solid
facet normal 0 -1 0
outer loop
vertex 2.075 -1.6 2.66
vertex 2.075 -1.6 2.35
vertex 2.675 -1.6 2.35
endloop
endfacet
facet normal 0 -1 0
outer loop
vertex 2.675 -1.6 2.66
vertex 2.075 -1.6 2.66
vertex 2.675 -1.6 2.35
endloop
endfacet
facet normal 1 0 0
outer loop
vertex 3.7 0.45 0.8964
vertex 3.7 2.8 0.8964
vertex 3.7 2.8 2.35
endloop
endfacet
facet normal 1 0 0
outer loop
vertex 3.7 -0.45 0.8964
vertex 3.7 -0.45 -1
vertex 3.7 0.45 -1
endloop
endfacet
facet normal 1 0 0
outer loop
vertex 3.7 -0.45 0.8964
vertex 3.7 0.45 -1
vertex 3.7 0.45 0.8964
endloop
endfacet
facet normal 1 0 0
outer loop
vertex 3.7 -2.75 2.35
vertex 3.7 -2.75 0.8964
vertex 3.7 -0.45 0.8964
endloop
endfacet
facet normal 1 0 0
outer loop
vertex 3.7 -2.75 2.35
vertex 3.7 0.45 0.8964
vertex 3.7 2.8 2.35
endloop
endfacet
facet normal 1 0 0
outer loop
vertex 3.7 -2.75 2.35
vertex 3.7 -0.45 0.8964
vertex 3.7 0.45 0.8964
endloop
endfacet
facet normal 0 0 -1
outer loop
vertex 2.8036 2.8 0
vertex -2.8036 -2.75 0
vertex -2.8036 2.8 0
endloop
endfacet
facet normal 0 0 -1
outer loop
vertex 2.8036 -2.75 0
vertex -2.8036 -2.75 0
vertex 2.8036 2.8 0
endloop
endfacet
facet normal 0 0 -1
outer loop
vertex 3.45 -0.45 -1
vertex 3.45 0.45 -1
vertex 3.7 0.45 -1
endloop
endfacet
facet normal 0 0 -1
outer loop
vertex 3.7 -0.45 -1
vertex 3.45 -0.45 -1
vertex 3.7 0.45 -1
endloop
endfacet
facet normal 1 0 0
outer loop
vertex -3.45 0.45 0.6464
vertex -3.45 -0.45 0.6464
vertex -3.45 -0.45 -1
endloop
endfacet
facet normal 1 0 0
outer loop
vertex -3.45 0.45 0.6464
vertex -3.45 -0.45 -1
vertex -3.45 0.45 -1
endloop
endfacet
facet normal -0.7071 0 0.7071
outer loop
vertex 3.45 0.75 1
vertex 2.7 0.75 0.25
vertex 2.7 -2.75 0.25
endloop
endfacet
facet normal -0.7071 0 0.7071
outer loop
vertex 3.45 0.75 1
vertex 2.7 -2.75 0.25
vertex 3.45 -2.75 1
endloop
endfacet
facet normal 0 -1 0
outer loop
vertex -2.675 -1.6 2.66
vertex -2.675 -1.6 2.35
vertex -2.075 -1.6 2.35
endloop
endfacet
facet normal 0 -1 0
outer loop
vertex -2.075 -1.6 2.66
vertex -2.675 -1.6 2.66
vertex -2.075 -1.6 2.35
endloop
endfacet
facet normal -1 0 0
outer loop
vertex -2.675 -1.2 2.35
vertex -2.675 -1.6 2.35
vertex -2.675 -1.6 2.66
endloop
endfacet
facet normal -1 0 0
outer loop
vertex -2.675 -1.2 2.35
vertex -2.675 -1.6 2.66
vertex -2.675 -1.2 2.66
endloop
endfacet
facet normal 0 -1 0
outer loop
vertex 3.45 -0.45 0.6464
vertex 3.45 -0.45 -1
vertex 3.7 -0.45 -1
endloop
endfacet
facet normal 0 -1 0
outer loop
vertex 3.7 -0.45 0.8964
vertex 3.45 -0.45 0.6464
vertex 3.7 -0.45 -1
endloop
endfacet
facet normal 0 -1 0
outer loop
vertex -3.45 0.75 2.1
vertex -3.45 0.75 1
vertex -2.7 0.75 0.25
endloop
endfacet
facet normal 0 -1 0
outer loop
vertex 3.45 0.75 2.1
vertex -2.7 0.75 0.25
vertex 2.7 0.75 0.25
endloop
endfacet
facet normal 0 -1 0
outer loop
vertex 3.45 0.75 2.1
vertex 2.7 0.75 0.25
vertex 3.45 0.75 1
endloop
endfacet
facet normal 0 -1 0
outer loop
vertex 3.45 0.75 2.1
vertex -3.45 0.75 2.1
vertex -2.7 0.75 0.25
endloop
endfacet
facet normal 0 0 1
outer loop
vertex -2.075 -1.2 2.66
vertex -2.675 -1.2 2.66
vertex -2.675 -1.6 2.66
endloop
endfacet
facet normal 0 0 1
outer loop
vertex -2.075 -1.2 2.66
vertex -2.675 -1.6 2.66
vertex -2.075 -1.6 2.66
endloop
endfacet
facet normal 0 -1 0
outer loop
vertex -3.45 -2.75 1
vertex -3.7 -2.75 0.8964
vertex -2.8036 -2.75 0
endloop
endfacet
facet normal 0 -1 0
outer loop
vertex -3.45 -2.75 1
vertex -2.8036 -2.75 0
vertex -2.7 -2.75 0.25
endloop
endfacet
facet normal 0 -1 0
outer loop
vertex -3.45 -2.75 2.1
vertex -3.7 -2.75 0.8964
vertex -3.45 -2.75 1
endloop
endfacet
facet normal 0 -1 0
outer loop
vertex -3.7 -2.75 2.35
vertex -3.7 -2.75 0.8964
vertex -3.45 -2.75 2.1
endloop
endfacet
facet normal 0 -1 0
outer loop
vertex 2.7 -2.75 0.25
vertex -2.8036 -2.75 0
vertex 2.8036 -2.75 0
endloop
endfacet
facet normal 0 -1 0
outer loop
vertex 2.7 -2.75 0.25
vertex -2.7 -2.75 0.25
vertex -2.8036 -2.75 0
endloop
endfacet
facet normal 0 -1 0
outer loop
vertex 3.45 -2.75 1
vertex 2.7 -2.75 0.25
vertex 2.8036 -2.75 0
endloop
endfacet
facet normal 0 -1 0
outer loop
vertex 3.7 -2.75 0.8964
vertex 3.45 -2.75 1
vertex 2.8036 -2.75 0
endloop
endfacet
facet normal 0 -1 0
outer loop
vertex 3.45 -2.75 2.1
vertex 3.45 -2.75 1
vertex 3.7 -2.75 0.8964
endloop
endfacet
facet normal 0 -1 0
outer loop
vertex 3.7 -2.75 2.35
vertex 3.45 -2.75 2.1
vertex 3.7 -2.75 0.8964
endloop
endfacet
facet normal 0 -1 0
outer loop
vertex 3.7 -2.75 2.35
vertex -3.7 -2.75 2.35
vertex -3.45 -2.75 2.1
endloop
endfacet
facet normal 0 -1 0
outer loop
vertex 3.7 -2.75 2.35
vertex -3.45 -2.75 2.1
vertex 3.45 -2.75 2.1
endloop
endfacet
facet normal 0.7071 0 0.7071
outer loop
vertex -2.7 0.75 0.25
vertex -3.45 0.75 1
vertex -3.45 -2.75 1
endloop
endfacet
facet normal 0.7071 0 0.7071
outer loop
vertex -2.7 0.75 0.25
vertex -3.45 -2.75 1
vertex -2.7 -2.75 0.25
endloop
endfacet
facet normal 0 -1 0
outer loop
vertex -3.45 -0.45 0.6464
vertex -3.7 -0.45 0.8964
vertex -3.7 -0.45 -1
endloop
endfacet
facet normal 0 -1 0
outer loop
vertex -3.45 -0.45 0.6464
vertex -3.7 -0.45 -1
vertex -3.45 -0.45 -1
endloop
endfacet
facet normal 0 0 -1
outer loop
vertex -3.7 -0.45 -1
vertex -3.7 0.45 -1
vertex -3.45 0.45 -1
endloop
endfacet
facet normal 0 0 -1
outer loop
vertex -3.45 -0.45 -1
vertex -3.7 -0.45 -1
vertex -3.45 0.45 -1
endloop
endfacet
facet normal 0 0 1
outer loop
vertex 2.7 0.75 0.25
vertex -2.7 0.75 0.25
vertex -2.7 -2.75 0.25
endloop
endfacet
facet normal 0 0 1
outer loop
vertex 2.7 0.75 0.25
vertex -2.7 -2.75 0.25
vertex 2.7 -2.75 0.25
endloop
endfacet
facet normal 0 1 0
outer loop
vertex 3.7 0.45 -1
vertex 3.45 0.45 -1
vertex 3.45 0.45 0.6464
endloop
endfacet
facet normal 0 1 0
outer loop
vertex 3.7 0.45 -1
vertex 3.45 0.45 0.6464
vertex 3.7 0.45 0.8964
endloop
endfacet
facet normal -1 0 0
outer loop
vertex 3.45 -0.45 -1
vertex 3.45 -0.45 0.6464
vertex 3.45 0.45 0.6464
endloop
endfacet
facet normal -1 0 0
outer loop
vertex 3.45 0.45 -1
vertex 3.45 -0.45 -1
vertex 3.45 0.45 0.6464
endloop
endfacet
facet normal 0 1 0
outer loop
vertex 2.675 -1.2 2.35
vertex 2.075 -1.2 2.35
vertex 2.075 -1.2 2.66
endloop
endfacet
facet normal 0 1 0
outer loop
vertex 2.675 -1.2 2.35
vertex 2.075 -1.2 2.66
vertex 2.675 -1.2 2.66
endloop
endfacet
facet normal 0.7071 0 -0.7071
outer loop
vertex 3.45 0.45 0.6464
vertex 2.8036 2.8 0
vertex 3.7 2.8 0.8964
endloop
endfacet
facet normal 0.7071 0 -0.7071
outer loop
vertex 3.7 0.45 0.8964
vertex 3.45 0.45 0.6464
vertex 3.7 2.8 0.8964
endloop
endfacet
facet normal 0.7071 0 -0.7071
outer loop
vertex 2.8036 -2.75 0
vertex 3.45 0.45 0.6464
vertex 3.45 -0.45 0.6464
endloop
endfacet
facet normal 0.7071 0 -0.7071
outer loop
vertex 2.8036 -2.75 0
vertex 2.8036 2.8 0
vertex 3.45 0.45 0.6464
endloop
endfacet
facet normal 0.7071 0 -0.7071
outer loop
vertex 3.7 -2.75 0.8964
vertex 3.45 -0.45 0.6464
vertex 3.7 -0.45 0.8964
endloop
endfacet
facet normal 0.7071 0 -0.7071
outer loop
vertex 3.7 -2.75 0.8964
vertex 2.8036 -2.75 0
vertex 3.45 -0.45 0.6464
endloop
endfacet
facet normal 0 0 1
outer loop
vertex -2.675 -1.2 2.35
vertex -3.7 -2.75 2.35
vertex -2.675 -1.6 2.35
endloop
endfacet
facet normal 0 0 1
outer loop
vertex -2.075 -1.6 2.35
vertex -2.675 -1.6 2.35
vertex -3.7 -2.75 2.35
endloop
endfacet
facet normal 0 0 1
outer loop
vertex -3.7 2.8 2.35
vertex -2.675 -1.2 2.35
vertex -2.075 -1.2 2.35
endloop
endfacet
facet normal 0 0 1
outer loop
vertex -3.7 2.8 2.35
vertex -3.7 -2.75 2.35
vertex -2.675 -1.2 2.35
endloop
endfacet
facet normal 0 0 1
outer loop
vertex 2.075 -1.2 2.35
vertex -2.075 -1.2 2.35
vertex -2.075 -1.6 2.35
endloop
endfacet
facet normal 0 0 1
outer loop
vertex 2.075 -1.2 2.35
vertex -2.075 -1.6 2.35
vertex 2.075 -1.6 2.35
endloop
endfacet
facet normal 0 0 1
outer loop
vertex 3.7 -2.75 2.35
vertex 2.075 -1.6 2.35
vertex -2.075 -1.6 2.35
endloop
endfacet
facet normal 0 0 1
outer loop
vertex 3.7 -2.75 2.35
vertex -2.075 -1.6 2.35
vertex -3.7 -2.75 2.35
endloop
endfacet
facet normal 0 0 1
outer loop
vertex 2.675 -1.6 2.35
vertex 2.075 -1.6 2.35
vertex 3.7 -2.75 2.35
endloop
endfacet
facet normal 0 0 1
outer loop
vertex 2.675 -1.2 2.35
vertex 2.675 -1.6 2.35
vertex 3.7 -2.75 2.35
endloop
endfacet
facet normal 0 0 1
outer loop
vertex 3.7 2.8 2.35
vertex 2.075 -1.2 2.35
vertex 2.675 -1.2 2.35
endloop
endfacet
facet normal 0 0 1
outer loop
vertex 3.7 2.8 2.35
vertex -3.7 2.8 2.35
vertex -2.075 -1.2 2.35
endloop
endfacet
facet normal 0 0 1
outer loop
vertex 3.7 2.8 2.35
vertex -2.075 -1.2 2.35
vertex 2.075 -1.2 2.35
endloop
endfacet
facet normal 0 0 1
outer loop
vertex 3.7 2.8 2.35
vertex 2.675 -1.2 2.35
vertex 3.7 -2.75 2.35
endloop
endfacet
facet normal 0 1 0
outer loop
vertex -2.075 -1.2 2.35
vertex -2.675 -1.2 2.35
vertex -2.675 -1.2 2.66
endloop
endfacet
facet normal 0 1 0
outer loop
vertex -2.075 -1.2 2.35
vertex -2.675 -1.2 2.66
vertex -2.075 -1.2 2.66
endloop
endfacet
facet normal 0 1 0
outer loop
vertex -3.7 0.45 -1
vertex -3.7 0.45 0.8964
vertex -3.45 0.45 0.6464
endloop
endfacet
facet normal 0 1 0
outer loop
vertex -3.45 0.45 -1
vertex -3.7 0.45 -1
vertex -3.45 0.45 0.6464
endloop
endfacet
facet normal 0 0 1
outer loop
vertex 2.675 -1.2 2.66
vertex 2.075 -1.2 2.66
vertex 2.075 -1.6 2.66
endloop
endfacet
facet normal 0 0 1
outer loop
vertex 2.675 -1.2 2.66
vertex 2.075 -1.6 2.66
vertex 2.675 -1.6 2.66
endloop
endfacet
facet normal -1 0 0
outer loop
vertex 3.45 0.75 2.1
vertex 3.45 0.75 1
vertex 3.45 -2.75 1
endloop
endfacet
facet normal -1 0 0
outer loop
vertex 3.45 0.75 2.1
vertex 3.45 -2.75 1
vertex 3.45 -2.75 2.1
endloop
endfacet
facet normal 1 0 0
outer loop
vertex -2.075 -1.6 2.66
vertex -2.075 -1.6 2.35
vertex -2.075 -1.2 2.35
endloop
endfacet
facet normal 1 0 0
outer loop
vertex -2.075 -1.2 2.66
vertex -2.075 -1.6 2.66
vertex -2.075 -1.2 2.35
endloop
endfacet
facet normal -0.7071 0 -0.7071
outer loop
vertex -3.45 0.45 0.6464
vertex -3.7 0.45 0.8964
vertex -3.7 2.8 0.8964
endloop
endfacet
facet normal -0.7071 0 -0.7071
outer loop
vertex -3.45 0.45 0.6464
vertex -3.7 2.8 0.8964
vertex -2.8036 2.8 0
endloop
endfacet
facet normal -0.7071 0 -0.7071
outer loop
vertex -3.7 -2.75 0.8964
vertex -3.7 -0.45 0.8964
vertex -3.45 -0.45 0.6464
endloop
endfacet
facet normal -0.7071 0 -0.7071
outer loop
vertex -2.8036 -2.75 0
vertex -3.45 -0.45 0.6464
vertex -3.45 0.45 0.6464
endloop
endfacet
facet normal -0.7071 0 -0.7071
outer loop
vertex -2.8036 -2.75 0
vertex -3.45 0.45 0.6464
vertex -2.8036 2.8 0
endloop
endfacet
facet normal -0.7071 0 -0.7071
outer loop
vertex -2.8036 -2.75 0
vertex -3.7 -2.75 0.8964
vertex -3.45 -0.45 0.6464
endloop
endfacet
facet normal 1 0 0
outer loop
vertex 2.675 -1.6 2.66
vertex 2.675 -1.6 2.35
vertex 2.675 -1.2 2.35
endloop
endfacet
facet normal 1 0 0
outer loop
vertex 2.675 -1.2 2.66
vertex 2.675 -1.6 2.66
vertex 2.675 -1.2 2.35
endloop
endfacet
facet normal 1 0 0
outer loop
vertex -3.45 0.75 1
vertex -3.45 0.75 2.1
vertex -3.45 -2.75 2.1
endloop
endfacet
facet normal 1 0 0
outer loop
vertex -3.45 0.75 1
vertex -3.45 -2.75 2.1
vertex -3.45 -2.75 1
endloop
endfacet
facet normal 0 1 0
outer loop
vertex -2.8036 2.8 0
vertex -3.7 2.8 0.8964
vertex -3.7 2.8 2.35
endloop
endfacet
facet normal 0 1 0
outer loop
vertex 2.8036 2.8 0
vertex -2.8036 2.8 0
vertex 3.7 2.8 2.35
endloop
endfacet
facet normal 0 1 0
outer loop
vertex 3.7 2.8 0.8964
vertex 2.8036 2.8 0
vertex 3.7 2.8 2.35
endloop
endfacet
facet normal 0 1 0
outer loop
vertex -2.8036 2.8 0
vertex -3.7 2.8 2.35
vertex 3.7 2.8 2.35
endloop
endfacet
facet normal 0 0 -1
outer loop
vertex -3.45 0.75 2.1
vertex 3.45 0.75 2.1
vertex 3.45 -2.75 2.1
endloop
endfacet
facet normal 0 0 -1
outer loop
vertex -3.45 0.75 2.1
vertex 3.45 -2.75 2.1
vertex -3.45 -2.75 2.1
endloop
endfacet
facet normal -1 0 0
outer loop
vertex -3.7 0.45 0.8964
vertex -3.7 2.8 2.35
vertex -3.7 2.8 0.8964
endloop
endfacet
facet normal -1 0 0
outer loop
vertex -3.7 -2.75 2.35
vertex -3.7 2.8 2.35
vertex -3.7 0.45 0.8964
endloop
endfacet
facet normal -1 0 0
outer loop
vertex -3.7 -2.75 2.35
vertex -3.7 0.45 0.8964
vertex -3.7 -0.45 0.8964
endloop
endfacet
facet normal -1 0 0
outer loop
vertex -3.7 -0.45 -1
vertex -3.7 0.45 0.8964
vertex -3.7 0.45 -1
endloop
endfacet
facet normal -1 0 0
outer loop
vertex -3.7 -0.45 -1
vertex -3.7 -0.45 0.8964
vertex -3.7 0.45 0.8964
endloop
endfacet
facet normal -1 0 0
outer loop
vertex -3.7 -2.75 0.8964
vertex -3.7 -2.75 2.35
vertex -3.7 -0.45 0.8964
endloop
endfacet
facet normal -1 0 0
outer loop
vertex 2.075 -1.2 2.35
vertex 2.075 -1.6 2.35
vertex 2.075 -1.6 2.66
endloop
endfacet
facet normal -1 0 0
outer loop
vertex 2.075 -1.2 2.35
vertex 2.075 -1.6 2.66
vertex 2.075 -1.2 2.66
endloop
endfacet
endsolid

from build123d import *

# Parameters (mm, degrees)
BULK_DEPTH              = 2.75
BULK_DEPTH_BACK         = 2.8
PEG_BASE_SKETCH_W       = 0.25
PEG_BASE_SKETCH_H       = 0.9
PEGS_DEPTH              = 3.35
RECEPTACLE_DEPTH        = 3.75
RECEPTACLE_DEPTH_BACK   = 0.75
SKETCH3_W               = 0.6
SKETCH3_H               = 0.4
UPPER_FINS_DEPTH        = 0.31
ALTIUM_AXIS_ALIGN_ANGLE = 90


with BuildPart() as part:
    # Base sketch → Bulk (new body, two sides)
    with BuildSketch(Plane.XY) as bulk_sk:
        Polygon((3.7, 2.35), (-3.7, 2.35), (-3.7, 0.896446609), (-2.803553391, 0), (2.803553391, 0), (3.7, 0.896446609), align=None)
    extrude(amount=BULK_DEPTH)
    extrude(bulk_sk.sketch, amount=-BULK_DEPTH_BACK)

    # Peg base sketch → Pegs (add)
    with BuildSketch(Plane(origin=(0, 2.35, 0), x_dir=(1, 0, 0), z_dir=(0, 1, 0))):
        with Locations((3.575, 0)):
            Rectangle(PEG_BASE_SKETCH_W, PEG_BASE_SKETCH_H)
        with Locations((-3.575, 0)):
            Rectangle(PEG_BASE_SKETCH_W, PEG_BASE_SKETCH_H)
    extrude(amount=-PEGS_DEPTH)

    # Base sketch<3> → Receptacle (cut, two sides)
    with BuildSketch(Plane.XY) as receptacle_sk:
        Polygon((-3.45, 1), (-2.7, 0.25), (2.7, 0.25), (3.45, 1), (3.45, 2.1), (-3.45, 2.1), align=None)
    extrude(amount=RECEPTACLE_DEPTH, mode=Mode.SUBTRACT)
    extrude(receptacle_sk.sketch, amount=-RECEPTACLE_DEPTH_BACK, mode=Mode.SUBTRACT)

    # Sketch3 → Upper fins (add)
    with BuildSketch(Plane(origin=(0, 2.35, 0), x_dir=(1, 0, 0), z_dir=(0, 1, 0))):
        with Locations((-2.375, -1.4)):
            Rectangle(SKETCH3_W, SKETCH3_H)
        with Locations((2.375, -1.4)):
            Rectangle(SKETCH3_W, SKETCH3_H)
    extrude(amount=UPPER_FINS_DEPTH)


with BuildPart() as part_1:
    # Altium axis align: moved
    add(part.part.rotate(Axis((0, 0, 0), (1, 0, 0)), ALTIUM_AXIS_ALIGN_ANGLE))


solid = part_1.part
